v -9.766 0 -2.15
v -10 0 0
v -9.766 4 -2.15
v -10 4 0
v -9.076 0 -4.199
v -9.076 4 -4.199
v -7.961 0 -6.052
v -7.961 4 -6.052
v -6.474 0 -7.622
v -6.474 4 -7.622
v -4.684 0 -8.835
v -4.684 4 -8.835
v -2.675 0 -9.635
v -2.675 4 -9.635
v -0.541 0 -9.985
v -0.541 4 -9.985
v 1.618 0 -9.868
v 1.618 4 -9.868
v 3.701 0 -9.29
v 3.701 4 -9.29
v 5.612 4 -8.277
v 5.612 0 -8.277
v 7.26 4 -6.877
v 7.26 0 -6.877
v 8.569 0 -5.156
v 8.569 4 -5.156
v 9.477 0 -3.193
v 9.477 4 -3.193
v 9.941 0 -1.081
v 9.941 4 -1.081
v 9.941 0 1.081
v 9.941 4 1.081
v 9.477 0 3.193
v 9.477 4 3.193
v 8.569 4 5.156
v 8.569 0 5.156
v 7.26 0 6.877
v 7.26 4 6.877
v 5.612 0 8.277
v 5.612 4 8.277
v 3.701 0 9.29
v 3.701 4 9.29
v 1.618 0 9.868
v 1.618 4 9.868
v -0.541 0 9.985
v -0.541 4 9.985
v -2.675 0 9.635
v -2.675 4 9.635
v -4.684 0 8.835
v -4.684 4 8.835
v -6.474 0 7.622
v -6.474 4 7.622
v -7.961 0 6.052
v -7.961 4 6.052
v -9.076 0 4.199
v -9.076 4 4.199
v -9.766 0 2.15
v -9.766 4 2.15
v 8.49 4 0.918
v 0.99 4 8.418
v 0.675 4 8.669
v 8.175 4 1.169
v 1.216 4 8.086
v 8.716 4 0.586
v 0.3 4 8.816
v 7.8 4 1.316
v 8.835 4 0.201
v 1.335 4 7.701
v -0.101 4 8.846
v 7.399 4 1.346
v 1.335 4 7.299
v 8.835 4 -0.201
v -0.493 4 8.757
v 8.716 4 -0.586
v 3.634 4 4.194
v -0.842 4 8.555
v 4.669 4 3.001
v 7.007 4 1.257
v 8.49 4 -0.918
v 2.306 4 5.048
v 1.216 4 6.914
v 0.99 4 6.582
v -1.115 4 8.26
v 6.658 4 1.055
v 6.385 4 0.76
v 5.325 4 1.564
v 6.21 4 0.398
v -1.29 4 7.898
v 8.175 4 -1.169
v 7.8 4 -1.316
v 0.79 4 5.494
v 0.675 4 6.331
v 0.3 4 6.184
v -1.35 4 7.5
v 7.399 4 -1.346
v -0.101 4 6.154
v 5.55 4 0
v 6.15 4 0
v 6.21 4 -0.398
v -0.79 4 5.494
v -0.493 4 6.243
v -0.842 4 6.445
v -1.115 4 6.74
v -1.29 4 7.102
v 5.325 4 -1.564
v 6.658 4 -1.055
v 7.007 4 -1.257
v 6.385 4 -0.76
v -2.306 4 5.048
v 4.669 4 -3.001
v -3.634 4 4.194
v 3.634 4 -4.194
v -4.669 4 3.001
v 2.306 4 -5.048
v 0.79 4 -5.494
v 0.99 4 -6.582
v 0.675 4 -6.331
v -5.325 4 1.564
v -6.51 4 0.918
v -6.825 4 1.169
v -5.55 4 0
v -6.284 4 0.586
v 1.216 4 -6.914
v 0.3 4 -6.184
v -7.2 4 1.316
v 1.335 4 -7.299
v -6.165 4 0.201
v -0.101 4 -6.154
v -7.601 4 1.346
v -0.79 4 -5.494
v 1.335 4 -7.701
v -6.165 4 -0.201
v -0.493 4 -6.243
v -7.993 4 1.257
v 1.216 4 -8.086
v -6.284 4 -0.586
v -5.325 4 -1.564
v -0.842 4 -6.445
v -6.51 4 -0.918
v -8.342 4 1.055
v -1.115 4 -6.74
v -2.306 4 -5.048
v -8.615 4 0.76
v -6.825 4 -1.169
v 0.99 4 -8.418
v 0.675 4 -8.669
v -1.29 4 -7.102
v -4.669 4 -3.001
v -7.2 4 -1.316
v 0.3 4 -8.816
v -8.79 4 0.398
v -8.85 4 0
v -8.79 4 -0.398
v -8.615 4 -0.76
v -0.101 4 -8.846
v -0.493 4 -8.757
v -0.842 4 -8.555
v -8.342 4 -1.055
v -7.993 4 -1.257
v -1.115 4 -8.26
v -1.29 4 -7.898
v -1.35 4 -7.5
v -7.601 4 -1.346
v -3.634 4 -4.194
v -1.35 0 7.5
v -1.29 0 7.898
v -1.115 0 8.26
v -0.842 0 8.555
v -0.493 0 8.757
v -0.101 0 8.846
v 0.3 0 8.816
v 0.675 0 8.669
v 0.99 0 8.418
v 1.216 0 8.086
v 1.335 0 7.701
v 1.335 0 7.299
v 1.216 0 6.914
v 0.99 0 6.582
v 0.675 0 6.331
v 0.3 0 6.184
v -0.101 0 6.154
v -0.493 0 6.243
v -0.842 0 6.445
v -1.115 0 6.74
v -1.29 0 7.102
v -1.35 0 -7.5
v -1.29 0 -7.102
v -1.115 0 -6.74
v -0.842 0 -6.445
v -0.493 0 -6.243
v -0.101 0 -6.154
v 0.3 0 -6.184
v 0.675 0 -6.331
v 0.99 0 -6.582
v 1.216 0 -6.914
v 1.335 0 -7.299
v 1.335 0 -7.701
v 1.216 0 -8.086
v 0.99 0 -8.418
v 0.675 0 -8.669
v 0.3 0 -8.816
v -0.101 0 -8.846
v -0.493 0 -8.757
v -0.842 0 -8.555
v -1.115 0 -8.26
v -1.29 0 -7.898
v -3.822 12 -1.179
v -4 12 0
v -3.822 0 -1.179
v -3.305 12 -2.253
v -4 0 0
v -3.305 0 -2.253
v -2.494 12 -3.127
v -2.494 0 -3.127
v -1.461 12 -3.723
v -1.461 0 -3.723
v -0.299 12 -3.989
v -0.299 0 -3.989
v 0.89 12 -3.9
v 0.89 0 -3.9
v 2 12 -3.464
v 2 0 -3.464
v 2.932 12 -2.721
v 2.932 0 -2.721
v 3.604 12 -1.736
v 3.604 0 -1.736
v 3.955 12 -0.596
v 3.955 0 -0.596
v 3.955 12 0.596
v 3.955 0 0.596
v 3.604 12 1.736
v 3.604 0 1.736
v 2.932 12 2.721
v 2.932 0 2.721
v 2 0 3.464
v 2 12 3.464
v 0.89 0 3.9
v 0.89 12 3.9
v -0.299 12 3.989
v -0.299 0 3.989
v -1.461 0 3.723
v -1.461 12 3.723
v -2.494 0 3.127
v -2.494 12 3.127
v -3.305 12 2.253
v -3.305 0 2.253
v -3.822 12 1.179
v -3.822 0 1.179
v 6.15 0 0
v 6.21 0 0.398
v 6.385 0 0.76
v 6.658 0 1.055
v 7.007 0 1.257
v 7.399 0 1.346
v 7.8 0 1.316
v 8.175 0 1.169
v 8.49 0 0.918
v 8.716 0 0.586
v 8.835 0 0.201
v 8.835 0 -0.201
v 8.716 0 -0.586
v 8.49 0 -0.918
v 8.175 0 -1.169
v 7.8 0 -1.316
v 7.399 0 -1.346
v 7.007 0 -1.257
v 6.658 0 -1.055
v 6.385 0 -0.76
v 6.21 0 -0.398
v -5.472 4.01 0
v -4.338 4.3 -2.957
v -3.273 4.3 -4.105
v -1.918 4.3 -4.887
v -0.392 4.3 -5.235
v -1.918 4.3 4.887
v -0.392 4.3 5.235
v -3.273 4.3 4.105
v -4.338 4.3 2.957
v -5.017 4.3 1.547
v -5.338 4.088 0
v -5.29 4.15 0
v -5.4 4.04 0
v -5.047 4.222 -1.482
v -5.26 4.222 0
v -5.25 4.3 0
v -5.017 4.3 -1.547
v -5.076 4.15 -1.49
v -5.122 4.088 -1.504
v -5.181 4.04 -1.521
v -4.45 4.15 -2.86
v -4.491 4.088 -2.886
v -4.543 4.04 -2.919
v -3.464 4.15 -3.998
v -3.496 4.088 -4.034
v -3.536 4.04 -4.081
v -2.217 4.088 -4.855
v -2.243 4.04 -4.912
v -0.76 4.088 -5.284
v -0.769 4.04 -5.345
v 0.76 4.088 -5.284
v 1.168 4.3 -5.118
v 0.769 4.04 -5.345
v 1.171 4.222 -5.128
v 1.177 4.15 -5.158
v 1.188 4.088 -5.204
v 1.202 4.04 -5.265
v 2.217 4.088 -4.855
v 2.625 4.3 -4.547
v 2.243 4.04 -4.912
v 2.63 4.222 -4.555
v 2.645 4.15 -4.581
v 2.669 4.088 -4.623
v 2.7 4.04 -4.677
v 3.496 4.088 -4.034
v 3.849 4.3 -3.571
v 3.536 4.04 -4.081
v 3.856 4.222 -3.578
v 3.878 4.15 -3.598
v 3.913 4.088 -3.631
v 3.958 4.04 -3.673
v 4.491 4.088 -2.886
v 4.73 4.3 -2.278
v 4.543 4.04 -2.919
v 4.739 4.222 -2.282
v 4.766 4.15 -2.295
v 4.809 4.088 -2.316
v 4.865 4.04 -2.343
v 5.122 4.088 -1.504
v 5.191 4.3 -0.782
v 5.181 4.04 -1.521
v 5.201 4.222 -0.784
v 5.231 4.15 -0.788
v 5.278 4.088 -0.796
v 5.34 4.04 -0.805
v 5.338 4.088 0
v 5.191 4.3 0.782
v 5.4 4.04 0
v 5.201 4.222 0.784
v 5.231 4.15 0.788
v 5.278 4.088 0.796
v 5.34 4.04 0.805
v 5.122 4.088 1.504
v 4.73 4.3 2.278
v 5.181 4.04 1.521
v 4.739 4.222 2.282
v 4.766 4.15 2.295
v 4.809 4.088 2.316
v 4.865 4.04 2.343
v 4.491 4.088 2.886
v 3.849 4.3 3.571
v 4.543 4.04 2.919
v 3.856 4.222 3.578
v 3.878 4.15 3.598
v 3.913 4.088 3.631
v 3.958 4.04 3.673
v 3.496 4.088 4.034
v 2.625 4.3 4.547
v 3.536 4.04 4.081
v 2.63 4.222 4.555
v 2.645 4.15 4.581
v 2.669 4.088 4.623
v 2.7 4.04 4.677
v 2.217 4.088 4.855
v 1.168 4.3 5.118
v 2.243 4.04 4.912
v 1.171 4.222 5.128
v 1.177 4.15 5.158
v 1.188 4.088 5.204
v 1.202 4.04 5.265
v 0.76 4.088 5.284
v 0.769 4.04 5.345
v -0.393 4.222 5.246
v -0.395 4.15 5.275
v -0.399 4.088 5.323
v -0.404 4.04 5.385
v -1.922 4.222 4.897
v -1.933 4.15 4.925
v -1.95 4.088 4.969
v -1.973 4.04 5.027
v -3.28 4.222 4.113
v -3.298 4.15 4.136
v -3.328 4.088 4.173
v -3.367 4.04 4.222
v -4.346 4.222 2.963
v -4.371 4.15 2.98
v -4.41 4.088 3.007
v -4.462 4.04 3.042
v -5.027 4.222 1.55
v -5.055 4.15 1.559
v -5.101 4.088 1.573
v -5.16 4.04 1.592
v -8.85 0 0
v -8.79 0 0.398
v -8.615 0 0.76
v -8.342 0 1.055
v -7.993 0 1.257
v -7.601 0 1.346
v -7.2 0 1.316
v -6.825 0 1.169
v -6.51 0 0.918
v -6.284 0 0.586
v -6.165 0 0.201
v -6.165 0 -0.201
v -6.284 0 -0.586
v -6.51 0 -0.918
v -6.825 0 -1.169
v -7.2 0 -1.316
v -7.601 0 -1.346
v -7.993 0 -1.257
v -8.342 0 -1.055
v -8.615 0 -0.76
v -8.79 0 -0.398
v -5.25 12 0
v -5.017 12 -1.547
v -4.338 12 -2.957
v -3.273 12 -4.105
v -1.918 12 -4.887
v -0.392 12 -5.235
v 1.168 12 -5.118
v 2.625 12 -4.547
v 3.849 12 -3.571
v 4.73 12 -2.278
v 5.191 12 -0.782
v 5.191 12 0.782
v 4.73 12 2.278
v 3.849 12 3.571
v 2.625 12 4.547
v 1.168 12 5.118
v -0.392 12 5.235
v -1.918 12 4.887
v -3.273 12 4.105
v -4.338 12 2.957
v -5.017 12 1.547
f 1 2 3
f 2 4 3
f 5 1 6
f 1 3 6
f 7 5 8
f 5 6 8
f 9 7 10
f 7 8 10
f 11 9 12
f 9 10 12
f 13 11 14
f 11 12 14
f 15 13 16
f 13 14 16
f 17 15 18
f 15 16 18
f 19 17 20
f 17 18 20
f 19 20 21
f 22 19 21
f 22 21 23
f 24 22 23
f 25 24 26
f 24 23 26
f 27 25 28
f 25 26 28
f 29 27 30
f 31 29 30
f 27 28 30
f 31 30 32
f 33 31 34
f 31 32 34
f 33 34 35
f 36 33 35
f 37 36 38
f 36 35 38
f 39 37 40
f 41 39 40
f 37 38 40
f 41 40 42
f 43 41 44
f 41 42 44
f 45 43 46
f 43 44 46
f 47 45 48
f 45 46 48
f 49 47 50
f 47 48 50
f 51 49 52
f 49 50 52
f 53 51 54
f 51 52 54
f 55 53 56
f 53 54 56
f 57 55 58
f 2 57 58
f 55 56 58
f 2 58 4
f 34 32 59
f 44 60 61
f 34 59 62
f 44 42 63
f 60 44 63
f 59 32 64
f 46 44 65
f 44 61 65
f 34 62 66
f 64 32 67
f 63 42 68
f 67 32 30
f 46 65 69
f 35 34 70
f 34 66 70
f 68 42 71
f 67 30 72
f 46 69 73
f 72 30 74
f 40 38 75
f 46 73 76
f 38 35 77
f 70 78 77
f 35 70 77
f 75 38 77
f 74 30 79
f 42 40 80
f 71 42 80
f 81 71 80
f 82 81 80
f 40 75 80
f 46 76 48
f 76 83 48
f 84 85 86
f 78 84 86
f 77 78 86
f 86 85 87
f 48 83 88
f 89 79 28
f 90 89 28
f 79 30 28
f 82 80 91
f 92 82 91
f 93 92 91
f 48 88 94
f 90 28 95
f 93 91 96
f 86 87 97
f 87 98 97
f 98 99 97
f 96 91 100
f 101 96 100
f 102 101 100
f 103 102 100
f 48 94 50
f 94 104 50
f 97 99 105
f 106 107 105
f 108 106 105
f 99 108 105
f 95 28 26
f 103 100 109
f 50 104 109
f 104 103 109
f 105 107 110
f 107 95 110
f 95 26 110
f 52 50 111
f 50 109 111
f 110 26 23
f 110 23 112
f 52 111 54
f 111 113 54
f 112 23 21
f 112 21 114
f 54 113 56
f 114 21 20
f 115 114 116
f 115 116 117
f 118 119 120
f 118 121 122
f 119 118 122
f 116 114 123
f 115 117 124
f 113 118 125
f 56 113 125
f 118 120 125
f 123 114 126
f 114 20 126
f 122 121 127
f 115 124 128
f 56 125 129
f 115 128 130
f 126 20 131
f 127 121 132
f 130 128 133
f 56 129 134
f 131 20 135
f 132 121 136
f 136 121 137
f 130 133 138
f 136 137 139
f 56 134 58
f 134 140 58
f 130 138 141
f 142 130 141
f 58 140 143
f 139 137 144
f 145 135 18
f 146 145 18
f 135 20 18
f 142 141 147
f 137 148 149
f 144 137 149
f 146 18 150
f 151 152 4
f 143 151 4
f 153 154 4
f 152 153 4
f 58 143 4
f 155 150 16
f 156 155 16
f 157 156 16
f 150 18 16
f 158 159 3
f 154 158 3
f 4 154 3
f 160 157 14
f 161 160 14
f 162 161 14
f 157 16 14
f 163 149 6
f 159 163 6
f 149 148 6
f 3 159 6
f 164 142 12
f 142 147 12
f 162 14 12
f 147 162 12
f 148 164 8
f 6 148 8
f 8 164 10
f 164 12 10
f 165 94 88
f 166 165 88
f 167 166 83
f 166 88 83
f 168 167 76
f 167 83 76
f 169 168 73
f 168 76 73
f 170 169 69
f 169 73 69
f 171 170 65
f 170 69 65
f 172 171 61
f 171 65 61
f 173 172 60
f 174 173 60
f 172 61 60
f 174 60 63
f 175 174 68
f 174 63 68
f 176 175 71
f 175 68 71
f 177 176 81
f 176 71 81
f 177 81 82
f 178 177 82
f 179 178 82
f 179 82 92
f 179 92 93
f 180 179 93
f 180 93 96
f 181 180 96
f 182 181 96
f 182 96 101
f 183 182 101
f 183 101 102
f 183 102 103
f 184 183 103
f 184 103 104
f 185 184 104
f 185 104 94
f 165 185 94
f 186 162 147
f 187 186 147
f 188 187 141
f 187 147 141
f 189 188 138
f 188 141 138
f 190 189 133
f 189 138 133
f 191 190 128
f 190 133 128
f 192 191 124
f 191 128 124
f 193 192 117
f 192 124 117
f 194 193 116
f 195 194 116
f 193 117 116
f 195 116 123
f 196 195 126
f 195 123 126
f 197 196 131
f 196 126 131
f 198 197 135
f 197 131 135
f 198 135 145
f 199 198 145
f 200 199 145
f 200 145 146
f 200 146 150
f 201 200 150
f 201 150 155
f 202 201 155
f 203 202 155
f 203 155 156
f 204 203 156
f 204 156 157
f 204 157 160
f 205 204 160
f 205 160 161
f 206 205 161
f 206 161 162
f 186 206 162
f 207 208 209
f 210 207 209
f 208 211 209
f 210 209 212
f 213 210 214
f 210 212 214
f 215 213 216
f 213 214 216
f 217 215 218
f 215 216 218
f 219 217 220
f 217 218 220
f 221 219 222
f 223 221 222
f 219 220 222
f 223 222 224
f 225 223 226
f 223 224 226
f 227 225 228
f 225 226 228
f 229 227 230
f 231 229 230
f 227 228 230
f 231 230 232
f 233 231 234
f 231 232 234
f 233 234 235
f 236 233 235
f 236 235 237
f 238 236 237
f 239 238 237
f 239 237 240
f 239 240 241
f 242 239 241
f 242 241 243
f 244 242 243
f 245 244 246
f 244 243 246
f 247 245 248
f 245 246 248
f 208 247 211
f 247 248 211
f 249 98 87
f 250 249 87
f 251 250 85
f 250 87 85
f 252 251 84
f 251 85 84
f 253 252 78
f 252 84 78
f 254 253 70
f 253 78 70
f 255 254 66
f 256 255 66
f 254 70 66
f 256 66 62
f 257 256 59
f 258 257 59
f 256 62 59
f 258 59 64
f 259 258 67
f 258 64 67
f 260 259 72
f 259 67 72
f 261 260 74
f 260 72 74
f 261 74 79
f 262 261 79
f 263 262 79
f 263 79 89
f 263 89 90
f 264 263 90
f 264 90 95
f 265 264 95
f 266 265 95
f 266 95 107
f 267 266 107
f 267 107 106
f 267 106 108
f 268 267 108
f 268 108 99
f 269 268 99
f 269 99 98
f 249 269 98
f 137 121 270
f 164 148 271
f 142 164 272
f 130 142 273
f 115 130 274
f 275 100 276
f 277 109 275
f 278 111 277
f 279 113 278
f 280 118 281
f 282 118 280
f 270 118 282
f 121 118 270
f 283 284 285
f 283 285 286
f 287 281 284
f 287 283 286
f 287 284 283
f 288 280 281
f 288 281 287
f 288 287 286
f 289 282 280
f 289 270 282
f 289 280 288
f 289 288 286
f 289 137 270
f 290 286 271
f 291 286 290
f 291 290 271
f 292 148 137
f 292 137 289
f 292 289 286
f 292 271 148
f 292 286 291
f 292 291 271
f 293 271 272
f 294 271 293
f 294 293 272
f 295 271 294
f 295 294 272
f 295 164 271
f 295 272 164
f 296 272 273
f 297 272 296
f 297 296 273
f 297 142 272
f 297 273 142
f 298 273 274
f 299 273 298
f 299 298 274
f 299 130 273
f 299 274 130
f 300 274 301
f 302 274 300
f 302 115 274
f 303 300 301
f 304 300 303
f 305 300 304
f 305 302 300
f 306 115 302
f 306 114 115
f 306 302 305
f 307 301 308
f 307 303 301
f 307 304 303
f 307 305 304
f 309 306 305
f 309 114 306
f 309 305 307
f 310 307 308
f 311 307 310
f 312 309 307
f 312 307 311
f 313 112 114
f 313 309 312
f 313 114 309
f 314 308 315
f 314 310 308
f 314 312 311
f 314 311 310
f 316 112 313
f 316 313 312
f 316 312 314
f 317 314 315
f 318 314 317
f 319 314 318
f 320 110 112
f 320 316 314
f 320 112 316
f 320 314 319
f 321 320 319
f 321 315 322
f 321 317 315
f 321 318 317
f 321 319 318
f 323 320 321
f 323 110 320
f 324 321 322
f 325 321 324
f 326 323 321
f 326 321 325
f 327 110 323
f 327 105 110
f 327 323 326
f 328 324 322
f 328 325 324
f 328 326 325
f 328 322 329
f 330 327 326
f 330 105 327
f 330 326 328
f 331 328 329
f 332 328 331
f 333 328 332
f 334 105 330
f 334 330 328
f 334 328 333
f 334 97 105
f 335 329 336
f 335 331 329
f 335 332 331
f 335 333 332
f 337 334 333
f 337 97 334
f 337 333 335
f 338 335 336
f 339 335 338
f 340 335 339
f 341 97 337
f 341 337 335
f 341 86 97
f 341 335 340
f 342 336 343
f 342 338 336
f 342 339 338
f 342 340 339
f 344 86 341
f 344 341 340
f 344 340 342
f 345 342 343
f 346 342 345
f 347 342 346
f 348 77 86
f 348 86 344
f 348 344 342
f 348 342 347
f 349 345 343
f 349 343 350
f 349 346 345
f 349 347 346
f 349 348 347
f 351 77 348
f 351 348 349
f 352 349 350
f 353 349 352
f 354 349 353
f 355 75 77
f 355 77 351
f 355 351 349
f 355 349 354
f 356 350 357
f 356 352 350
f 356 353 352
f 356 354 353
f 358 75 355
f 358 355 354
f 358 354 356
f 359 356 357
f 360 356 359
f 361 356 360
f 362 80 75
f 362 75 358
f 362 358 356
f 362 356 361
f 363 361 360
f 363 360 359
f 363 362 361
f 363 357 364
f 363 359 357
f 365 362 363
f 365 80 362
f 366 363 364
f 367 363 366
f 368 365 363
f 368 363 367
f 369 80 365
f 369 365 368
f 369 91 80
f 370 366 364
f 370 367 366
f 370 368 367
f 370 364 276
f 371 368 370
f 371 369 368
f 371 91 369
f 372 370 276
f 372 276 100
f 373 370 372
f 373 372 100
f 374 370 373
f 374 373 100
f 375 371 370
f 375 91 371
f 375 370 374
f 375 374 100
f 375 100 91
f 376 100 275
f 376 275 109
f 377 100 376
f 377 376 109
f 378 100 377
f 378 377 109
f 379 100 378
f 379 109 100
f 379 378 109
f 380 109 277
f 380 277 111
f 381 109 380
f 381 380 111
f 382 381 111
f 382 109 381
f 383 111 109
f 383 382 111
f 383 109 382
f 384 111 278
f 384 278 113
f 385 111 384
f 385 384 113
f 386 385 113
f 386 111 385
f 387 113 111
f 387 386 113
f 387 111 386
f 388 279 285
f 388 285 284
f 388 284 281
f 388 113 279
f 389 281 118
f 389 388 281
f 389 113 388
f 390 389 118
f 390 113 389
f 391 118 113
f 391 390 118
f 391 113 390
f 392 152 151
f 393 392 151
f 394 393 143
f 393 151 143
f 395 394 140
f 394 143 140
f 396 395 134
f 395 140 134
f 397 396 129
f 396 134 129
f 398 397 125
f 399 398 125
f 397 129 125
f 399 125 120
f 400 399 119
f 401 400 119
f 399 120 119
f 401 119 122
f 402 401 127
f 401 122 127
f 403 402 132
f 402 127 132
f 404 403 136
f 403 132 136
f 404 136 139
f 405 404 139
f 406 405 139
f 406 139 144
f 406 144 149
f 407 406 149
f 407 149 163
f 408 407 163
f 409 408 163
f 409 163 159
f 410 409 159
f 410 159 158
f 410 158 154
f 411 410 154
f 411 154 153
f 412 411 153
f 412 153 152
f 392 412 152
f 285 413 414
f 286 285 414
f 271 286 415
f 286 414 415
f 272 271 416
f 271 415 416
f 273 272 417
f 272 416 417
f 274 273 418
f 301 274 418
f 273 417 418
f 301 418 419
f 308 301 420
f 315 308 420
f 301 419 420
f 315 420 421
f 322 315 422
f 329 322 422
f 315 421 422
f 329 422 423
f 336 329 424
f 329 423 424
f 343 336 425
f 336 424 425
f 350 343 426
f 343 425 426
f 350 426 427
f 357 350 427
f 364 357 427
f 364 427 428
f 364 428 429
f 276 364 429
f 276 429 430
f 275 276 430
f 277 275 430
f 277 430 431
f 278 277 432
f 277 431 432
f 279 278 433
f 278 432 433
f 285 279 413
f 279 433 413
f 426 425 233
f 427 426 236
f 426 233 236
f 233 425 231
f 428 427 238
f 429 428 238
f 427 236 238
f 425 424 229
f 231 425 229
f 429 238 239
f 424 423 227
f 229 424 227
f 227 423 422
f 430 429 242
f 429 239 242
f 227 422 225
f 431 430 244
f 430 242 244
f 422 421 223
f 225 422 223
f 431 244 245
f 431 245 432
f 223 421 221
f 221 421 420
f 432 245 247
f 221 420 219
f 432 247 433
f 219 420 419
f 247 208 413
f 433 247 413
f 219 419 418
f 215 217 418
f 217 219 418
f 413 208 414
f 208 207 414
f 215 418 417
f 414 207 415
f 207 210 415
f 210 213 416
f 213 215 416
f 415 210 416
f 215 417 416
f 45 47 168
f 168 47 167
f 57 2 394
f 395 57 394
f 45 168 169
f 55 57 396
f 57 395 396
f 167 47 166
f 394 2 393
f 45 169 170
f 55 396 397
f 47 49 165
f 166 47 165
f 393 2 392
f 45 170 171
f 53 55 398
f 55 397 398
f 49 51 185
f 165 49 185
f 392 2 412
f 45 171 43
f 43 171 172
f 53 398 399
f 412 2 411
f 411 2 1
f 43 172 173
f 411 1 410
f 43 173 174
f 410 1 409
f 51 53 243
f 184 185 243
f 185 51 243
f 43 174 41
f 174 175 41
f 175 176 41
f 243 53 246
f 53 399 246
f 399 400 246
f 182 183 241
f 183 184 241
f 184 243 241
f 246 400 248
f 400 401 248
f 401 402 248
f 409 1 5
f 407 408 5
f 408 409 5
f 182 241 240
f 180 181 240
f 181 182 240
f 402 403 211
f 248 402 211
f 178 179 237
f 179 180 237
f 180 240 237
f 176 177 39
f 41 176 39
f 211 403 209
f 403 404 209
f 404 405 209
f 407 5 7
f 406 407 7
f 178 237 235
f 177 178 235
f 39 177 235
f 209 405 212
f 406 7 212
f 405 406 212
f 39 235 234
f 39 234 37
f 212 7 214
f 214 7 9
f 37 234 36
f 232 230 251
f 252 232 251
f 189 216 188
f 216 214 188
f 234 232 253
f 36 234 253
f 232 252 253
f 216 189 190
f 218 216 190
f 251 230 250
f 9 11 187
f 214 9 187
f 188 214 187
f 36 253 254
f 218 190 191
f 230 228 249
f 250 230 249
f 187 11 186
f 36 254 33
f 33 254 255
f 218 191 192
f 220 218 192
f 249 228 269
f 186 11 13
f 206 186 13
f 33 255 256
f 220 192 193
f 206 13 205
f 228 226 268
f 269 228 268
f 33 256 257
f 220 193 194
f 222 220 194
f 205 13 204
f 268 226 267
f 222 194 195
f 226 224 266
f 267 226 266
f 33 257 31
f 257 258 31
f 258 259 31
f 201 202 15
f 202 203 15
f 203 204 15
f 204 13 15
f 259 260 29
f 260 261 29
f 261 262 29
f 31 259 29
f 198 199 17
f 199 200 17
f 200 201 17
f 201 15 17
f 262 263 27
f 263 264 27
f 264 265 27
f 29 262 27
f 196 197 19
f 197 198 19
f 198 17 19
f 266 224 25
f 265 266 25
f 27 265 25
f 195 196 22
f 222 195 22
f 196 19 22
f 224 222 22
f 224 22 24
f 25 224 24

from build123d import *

# Parameters (mm, degrees)
SKETCH3_R          = 1.35
CUT_EXTRUDE1_DEPTH = 10
FILLET1_R          = 0.3


with BuildPart() as part:
    # Sketch2 → Revolve1 (revolve)
    with BuildSketch(Plane.XY, mode=Mode.PRIVATE) as revolve1_sk:
        Polygon((4, 12), (4, 0), (10, 0), (10, 4), (5.25, 4), (5.25, 12), align=None)
    revolve(revolve1_sk.sketch.rotate(Axis((0, 12, 0), (0, -1, 0)), 180), axis=Axis((0, 12, 0), (0, -1, 0)))

    # Sketch3 → Cut-Extrude1 (cut)
    with BuildSketch(Plane(origin=(0, 4, 0), x_dir=(1, 0, 0), z_dir=(0, 1, 0))):
        with Locations(Location((7.5, 0, 0), (0, 0, 180))):
            Circle(SKETCH3_R)
        with Locations(Location((0, -7.5, 0), (0, 0, 180))):
            Circle(SKETCH3_R)
        with Locations(Location((-7.5, 0, 0), (0, 0, 180))):
            Circle(SKETCH3_R)
        with Locations(Location((0, 7.5, 0), (0, 0, 180))):
            Circle(SKETCH3_R)
    extrude(amount=-CUT_EXTRUDE1_DEPTH, mode=Mode.SUBTRACT)

    # Fillet1
    fillet1_edges = [part.edges().sort_by_distance(p)[0] for p in [
        (5.25, 4, 0),
    ]]
    fillet(fillet1_edges, radius=FILLET1_R)


solid = part.part
